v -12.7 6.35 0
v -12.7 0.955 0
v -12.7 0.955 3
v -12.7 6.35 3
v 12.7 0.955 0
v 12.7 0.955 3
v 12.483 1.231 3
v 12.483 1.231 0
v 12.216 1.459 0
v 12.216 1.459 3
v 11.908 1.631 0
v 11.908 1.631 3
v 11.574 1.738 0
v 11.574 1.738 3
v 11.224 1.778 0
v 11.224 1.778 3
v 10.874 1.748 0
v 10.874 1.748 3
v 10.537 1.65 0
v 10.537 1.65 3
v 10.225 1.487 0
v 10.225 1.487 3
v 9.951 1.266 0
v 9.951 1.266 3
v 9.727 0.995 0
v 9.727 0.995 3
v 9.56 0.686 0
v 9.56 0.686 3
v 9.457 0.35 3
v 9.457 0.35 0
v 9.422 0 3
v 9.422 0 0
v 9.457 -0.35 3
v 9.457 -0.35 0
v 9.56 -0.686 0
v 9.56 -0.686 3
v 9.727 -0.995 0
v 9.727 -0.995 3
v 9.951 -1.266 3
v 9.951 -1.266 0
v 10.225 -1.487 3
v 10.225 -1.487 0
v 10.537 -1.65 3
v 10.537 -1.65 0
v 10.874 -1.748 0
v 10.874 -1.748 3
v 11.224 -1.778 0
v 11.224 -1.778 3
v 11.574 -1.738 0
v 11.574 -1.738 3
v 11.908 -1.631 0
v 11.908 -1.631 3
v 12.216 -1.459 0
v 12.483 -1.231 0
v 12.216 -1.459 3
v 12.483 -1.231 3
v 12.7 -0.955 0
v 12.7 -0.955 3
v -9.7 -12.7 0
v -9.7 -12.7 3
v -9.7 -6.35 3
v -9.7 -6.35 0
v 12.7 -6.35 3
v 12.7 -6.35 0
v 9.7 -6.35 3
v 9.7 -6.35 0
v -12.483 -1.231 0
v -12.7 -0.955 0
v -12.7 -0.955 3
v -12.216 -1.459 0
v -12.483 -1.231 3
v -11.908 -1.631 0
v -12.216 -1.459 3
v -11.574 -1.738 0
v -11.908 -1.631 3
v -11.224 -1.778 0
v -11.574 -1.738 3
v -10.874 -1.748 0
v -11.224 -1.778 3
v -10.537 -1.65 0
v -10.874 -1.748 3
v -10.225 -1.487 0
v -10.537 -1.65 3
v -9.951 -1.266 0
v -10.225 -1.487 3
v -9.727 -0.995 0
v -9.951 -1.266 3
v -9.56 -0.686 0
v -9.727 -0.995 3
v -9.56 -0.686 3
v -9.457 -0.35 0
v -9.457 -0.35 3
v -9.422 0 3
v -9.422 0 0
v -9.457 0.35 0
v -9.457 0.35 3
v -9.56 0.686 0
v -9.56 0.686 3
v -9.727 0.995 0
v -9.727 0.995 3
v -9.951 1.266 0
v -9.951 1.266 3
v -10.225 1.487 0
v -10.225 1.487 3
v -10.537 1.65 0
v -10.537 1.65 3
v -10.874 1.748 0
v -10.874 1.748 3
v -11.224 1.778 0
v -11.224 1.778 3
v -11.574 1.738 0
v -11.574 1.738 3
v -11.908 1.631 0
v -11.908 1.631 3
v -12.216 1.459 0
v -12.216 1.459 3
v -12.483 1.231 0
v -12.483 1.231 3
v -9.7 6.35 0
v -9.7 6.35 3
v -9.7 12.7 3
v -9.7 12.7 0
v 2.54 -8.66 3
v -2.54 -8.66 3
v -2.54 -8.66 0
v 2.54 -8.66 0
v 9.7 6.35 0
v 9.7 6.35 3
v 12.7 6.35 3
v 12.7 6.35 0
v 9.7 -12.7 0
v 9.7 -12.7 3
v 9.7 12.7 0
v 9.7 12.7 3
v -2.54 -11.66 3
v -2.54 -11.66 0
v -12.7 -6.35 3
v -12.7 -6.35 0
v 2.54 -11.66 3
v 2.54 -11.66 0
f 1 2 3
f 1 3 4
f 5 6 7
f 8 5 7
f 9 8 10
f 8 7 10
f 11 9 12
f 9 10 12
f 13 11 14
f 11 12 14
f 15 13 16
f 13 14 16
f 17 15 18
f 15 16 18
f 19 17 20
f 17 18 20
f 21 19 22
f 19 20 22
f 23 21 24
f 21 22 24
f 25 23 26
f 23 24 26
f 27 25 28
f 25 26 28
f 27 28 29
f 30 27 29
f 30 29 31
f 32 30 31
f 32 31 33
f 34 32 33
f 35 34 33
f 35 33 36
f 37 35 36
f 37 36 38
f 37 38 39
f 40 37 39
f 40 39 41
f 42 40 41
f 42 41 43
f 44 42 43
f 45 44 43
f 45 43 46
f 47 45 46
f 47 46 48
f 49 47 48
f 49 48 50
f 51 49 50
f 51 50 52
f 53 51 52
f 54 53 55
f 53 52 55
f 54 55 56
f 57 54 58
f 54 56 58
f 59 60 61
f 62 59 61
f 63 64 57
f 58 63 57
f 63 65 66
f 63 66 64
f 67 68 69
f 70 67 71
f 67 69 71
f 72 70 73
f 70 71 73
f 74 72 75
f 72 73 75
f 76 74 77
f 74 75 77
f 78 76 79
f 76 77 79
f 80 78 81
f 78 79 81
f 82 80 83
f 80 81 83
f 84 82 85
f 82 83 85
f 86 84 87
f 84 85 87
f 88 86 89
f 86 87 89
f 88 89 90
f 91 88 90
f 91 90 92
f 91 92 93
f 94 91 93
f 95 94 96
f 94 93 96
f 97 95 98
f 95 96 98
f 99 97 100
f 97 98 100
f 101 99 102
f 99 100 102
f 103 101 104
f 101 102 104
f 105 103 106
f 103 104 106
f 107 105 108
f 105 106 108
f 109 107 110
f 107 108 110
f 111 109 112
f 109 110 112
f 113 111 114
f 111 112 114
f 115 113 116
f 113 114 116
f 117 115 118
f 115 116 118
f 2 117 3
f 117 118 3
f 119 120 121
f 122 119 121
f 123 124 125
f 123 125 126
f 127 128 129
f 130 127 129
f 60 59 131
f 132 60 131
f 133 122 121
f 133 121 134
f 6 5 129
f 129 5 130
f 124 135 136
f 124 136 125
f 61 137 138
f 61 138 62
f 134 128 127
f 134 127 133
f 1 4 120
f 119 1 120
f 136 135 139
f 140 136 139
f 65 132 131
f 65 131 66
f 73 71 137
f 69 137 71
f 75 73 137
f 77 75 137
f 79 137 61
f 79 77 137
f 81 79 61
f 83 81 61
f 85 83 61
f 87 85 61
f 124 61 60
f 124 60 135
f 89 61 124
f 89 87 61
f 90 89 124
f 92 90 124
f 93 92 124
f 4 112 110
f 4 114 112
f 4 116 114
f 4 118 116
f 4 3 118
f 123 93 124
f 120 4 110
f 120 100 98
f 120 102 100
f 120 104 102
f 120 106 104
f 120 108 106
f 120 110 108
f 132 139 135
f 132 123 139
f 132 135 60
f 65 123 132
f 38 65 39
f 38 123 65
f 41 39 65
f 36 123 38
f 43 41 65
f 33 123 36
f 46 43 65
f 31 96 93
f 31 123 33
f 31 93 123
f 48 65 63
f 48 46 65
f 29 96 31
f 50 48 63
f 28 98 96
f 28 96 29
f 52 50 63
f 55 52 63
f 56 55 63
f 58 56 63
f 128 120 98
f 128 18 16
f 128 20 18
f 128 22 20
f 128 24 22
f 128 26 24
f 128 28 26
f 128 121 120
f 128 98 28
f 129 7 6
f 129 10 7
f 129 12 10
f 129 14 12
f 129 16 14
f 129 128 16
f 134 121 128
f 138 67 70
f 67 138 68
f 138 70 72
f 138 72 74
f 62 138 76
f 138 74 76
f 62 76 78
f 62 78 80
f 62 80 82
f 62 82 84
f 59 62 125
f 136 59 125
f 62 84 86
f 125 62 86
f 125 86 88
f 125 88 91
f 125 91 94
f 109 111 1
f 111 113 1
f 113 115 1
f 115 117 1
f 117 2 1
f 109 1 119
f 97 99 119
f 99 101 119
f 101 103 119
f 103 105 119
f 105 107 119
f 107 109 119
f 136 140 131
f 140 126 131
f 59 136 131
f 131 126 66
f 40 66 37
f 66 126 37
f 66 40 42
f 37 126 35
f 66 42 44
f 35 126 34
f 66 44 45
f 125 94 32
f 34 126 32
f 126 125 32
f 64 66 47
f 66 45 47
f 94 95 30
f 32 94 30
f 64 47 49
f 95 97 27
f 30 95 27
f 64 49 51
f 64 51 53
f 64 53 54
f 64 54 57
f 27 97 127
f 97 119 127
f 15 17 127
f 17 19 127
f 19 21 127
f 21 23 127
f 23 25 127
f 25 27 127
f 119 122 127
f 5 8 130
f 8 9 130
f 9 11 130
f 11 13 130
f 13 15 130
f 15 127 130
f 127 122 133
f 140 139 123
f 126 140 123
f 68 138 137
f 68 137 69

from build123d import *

# Parameters (mm, degrees)
SKETCH1_W           = 25.4
SKETCH1_H           = 25.4
BOSS_EXTRUDE1_DEPTH = 3
SKETCH2_R           = 1.778
SKETCH2_W           = 3
SKETCH2_H           = 6.35
SKETCH2_W_2         = 5.08
SKETCH2_H_2         = 3
CUT_EXTRUDE1_DEPTH  = 19.209338264


with BuildPart() as part:
    # Sketch1 → Boss-Extrude1 (new body)
    with BuildSketch(Plane.XY):
        Rectangle(SKETCH1_W, SKETCH1_H)
    extrude(amount=BOSS_EXTRUDE1_DEPTH)

    # Sketch2 → Cut-Extrude1 (cut, through all)
    with BuildSketch(Plane.XY.offset(3)):
        with Locations((-11.2, 0)):
            Circle(SKETCH2_R)
        with Locations((11.2, 0)):
            Circle(SKETCH2_R)
        with Locations((11.2, 9.525)):
            Rectangle(SKETCH2_W, SKETCH2_H)
        with Locations((11.2, -9.525)):
            Rectangle(SKETCH2_W, SKETCH2_H)
        with Locations((-11.2, 9.525)):
            Rectangle(SKETCH2_W, SKETCH2_H)
        with Locations((-11.2, -9.525)):
            Rectangle(SKETCH2_W, SKETCH2_H)
        with Locations((0, -10.16)):
            Rectangle(SKETCH2_W_2, SKETCH2_H_2)
    extrude(amount=-CUT_EXTRUDE1_DEPTH, mode=Mode.SUBTRACT)


solid = part.part
